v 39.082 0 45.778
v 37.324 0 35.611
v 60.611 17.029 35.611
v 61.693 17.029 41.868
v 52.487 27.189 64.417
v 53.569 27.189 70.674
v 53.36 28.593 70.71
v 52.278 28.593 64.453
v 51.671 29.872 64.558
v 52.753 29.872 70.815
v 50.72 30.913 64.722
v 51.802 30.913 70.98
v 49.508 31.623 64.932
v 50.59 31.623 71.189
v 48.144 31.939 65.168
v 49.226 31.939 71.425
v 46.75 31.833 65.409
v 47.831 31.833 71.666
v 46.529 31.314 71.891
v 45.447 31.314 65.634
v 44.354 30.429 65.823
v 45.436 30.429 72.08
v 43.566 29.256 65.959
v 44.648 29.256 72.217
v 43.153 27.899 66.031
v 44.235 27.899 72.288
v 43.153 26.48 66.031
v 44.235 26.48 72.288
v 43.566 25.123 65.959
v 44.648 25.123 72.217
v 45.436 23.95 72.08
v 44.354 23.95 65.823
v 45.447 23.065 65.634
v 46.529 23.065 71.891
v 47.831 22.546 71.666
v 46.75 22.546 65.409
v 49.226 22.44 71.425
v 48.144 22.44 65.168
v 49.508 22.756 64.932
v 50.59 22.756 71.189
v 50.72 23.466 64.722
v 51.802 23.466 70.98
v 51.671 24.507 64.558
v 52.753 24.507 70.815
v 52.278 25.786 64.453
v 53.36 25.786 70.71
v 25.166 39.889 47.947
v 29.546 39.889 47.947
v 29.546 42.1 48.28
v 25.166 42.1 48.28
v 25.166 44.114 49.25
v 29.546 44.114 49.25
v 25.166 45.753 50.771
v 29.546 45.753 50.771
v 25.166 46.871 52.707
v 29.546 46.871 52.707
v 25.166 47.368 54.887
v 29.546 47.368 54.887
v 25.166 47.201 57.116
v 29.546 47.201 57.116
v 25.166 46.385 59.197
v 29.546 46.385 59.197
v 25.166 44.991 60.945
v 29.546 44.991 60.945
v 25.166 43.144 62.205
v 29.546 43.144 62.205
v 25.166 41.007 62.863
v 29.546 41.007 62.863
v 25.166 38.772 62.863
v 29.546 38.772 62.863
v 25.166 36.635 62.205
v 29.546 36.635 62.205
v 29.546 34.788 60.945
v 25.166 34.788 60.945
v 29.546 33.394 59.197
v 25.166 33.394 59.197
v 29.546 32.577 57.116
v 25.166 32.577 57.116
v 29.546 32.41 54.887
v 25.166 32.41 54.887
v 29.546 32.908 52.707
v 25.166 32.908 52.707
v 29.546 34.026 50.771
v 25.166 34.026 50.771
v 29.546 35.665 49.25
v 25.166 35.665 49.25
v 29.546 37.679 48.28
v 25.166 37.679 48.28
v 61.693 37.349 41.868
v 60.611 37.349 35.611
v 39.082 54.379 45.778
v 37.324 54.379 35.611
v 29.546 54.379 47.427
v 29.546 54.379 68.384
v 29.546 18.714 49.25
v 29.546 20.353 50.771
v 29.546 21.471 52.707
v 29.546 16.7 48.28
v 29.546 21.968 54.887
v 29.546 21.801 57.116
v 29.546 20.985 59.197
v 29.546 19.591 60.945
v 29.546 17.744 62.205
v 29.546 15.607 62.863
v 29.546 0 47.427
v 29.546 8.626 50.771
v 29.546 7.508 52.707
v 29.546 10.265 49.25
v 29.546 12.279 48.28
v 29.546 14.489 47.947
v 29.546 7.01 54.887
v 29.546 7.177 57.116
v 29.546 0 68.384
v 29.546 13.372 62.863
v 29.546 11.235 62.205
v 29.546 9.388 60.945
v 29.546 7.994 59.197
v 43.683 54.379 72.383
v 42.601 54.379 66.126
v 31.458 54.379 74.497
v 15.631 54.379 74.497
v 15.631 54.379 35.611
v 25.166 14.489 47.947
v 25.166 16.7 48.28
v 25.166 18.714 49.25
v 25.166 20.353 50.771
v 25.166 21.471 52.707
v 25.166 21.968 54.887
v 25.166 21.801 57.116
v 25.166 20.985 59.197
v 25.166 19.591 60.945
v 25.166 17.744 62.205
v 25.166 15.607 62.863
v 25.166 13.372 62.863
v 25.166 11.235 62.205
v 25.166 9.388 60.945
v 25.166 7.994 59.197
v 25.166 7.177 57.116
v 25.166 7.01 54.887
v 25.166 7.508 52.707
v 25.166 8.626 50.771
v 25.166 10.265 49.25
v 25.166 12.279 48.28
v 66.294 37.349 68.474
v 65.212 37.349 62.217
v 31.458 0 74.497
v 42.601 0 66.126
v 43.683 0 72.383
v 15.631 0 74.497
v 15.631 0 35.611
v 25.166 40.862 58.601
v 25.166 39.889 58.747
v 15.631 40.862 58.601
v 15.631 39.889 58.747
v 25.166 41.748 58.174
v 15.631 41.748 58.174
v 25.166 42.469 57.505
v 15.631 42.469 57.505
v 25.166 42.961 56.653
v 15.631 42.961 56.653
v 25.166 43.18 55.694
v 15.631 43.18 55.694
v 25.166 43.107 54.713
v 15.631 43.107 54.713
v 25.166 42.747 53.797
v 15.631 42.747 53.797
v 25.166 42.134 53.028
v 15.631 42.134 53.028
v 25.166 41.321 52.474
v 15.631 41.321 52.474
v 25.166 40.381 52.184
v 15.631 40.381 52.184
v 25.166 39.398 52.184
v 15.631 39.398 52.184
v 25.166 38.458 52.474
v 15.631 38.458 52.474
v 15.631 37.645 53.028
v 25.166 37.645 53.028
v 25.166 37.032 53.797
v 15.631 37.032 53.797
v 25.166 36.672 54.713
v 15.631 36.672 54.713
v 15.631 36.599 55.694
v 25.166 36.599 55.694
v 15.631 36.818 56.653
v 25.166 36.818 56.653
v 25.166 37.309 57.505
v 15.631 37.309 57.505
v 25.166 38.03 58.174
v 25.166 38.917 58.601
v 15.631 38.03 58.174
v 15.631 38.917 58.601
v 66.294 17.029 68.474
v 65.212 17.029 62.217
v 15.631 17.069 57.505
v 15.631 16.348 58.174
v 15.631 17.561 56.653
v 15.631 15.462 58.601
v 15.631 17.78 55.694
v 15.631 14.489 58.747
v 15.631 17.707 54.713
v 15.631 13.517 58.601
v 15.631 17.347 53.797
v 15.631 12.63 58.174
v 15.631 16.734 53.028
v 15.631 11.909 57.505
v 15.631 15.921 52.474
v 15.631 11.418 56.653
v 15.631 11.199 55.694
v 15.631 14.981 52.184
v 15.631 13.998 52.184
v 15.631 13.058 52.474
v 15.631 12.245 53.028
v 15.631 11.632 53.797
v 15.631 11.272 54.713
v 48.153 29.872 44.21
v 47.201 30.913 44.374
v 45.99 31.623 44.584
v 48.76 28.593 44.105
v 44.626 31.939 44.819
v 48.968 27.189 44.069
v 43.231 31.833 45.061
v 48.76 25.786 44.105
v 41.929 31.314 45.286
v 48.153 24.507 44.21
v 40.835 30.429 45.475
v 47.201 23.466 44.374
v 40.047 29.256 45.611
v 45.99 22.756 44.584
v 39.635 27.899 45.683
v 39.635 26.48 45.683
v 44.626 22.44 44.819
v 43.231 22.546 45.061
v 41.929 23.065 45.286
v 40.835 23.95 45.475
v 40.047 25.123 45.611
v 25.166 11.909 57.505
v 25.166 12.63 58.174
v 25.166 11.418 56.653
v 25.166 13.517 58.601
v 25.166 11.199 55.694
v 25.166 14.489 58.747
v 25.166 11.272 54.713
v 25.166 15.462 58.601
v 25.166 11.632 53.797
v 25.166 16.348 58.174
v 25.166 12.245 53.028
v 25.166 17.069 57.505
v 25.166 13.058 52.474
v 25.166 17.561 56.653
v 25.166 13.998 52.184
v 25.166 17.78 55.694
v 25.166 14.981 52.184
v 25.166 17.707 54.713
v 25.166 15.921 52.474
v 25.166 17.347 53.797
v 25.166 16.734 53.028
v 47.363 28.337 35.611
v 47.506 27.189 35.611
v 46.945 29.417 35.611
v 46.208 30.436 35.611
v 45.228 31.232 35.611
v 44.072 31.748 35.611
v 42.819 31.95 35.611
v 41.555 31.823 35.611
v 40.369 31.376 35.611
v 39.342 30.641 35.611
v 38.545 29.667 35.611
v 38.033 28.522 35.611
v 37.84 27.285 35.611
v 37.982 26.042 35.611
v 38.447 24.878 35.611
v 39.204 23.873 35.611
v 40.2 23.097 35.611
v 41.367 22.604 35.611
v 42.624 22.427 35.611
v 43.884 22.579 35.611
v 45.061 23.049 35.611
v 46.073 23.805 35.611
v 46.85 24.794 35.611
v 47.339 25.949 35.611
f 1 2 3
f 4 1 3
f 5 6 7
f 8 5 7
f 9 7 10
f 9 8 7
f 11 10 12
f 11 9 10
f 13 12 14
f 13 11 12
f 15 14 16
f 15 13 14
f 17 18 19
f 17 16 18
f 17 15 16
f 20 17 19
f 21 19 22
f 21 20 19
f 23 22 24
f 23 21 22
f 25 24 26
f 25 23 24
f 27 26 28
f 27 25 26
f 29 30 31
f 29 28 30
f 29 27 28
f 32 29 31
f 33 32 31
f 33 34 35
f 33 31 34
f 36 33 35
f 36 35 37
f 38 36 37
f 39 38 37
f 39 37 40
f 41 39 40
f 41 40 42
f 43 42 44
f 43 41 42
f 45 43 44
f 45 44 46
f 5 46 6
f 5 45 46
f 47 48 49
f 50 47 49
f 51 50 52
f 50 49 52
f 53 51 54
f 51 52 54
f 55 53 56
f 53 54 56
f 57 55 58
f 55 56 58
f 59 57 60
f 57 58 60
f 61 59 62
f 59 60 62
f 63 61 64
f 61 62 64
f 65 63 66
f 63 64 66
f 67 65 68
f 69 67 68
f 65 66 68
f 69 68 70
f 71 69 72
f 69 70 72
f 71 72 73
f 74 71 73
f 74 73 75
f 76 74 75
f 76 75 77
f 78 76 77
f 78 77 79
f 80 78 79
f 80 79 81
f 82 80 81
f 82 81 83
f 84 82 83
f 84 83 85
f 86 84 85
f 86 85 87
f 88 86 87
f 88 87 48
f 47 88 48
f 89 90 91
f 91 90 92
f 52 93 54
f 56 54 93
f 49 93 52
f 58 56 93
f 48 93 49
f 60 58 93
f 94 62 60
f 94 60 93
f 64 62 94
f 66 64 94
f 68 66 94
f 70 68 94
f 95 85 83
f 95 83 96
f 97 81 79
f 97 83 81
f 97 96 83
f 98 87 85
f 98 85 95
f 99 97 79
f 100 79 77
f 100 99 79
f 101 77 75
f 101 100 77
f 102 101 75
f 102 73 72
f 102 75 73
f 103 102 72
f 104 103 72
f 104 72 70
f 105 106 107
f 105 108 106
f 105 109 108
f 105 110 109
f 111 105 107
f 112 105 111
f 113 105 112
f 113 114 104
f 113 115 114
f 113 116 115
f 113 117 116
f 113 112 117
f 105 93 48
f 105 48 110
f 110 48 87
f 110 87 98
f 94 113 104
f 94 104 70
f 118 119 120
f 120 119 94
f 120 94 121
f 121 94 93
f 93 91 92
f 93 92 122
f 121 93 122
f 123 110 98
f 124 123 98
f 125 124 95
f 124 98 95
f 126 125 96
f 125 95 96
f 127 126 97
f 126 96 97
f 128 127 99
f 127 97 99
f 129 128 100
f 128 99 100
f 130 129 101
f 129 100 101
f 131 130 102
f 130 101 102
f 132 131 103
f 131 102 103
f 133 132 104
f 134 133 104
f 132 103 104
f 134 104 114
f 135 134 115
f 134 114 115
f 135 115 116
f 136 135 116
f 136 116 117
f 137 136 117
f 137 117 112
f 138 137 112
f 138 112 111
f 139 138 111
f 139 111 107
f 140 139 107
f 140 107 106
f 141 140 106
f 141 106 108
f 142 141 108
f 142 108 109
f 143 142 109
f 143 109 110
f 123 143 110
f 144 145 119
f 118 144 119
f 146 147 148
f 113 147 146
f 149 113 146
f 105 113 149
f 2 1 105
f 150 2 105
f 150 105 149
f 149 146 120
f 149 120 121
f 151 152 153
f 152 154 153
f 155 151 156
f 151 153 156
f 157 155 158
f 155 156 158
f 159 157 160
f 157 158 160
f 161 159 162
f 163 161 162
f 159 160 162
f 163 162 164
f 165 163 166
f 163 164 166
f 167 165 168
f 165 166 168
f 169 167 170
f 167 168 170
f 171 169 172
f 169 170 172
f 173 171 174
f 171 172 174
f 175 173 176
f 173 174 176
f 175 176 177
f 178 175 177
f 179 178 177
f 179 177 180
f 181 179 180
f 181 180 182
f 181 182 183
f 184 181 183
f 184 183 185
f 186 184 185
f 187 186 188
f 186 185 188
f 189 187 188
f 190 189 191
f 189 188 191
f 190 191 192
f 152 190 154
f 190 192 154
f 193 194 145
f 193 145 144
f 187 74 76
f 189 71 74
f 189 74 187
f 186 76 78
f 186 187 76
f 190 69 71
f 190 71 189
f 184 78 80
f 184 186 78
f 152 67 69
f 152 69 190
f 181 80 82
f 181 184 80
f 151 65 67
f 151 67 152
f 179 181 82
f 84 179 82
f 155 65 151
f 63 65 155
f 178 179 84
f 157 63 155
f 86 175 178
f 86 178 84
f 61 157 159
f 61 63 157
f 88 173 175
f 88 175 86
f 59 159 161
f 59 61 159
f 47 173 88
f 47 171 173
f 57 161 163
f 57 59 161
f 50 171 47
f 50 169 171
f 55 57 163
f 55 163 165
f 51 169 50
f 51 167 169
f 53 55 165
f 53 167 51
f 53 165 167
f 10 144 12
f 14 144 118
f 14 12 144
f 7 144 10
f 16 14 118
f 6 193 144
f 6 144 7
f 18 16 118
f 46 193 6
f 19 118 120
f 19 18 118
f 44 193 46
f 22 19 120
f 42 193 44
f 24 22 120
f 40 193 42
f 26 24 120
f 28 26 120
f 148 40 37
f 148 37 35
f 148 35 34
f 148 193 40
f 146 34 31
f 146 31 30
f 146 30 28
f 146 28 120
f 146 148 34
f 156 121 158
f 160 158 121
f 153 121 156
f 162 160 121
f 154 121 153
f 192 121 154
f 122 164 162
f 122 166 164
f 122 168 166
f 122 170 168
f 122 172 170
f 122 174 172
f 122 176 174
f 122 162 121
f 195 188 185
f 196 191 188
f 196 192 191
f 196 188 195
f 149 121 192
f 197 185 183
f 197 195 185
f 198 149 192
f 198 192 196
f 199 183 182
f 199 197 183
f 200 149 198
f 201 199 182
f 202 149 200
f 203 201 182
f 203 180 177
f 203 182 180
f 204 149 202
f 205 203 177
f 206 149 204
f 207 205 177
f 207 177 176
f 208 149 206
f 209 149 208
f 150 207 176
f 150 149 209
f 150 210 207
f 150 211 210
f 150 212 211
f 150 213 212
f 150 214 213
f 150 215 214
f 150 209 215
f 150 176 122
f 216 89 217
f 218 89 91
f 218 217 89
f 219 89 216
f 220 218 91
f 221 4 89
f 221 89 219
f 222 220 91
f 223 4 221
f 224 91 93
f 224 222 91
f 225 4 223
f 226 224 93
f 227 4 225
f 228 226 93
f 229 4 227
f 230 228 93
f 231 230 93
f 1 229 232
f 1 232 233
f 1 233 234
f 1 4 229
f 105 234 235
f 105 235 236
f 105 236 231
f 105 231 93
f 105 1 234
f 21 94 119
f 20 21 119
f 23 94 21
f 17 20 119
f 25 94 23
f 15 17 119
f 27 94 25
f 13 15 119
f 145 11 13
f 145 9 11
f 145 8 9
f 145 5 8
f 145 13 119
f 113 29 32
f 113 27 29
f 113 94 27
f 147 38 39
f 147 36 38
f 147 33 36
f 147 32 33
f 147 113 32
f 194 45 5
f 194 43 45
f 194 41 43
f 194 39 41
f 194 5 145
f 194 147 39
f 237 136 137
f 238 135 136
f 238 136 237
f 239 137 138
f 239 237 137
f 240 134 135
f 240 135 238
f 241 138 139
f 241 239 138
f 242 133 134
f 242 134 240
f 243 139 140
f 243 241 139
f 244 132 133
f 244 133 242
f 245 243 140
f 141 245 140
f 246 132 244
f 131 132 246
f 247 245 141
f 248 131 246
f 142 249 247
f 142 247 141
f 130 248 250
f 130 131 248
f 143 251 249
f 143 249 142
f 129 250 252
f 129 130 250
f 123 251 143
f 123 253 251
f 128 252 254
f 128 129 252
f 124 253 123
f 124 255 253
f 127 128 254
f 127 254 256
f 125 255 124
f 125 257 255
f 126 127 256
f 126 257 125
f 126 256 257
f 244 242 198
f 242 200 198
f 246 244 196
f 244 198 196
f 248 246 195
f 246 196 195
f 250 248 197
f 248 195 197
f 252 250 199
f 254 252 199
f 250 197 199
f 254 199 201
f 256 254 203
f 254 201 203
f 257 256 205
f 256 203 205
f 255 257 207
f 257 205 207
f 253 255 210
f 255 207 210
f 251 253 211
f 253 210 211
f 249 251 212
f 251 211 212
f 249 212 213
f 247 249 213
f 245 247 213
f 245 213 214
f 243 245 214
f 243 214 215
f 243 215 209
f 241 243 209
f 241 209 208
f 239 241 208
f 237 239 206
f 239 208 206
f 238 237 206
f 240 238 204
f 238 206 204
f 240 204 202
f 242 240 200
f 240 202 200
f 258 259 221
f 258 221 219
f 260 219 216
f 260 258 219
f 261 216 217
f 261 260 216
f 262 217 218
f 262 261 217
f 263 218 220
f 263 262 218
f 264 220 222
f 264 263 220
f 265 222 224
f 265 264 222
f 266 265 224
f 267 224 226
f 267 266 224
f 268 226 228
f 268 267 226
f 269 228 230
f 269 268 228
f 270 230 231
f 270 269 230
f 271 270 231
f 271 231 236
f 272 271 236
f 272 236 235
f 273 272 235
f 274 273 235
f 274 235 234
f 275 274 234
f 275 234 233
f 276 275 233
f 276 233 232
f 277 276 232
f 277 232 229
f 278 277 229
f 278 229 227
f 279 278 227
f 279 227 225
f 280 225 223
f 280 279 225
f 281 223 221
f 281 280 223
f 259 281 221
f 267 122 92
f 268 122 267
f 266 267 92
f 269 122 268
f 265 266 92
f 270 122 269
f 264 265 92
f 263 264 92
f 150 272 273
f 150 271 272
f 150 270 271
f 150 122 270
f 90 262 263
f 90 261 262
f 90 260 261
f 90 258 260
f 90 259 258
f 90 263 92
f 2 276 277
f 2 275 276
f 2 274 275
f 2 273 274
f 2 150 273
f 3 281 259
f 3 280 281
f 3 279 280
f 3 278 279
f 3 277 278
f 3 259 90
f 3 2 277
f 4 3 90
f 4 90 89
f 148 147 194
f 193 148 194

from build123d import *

# Parameters (mm, degrees)
BOSS_EXTRUDE1_DEPTH                     = 54.37886
CUT_EXTRUDE1_DEPTH                      = 87.700652431
CUT_EXTRUDE1_DEPTH_BACK                 = 87.700652431
SKETCH2_R                               = 4.7625
CBORE_FOR_M6_HEX_HEAD_BOLT1_D           = 6.6
CBORE_FOR_M6_HEX_HEAD_BOLT1_DEPTH       = 14.019159957
CBORE_FOR_M6_HEX_HEAD_BOLT1_CBORE_D     = 15
CBORE_FOR_M6_HEX_HEAD_BOLT1_CBORE_DEPTH = 4.38
CBORE_FOR_M6_HEX_HEAD_BOLT1_TIP         = 1.982840043


with BuildPart() as part:
    # Sketch1 → Boss-Extrude1 (new body)
    with BuildSketch(Plane(origin=(0, 0, 0), x_dir=(1, 0, 0), z_dir=(0, 1, 0))):
        Polygon((15.630864679, -74.497263655), (15.630864679, -35.611217769), (60.611215954, -35.611217769), (61.693150972, -41.86836701), (29.545852981, -47.427014582), (29.545852981, -68.383645943), (65.211603651, -62.21661634), (66.293538669, -68.47376558), (31.457873152, -74.497263655), align=None)
    extrude(amount=BOSS_EXTRUDE1_DEPTH)

    # Sketch2 → Cut-Extrude1 (cut, two sides: drawn at the far end of the back side and taken through both)
    with BuildSketch(Plane(origin=(13.420740042, 0, 77.616097039), x_dir=(0.9853778331324855, 0, -0.17038346742312627), z_dir=(0.17038346742312627, 0, 0.9853778331324856)).offset(-CUT_EXTRUDE1_DEPTH_BACK)):
        with Locations((35.981087332, 27.18943)):
            Circle(SKETCH2_R)
        Polygon((30.711163119, 0), (53.657385878, 17.02943), (53.657385878, 0), align=None)
        Polygon((53.657385878, 37.34943), (30.711163119, 54.37886), (53.657385878, 54.37886), align=None)
    extrude(amount=CUT_EXTRUDE1_DEPTH + CUT_EXTRUDE1_DEPTH_BACK, mode=Mode.SUBTRACT)

    # CBORE for M6 Hex Head Bolt1
    with Locations(Plane(origin=(29.545852981, 0, 0), x_dir=(0, 0, -1), z_dir=(1, 0, 0))):
        with Locations((-55.447263655, 14.48943), (-55.447263655, 39.88943)):
            CounterBoreHole(CBORE_FOR_M6_HEX_HEAD_BOLT1_D / 2, CBORE_FOR_M6_HEX_HEAD_BOLT1_CBORE_D / 2, CBORE_FOR_M6_HEX_HEAD_BOLT1_CBORE_DEPTH, depth=CBORE_FOR_M6_HEX_HEAD_BOLT1_DEPTH)
            with Locations((0, 0, -(CBORE_FOR_M6_HEX_HEAD_BOLT1_DEPTH + CBORE_FOR_M6_HEX_HEAD_BOLT1_TIP / 2))):  # 118° drill point
                Cone(0, CBORE_FOR_M6_HEX_HEAD_BOLT1_D / 2, CBORE_FOR_M6_HEX_HEAD_BOLT1_TIP, mode=Mode.SUBTRACT)


solid = part.part
